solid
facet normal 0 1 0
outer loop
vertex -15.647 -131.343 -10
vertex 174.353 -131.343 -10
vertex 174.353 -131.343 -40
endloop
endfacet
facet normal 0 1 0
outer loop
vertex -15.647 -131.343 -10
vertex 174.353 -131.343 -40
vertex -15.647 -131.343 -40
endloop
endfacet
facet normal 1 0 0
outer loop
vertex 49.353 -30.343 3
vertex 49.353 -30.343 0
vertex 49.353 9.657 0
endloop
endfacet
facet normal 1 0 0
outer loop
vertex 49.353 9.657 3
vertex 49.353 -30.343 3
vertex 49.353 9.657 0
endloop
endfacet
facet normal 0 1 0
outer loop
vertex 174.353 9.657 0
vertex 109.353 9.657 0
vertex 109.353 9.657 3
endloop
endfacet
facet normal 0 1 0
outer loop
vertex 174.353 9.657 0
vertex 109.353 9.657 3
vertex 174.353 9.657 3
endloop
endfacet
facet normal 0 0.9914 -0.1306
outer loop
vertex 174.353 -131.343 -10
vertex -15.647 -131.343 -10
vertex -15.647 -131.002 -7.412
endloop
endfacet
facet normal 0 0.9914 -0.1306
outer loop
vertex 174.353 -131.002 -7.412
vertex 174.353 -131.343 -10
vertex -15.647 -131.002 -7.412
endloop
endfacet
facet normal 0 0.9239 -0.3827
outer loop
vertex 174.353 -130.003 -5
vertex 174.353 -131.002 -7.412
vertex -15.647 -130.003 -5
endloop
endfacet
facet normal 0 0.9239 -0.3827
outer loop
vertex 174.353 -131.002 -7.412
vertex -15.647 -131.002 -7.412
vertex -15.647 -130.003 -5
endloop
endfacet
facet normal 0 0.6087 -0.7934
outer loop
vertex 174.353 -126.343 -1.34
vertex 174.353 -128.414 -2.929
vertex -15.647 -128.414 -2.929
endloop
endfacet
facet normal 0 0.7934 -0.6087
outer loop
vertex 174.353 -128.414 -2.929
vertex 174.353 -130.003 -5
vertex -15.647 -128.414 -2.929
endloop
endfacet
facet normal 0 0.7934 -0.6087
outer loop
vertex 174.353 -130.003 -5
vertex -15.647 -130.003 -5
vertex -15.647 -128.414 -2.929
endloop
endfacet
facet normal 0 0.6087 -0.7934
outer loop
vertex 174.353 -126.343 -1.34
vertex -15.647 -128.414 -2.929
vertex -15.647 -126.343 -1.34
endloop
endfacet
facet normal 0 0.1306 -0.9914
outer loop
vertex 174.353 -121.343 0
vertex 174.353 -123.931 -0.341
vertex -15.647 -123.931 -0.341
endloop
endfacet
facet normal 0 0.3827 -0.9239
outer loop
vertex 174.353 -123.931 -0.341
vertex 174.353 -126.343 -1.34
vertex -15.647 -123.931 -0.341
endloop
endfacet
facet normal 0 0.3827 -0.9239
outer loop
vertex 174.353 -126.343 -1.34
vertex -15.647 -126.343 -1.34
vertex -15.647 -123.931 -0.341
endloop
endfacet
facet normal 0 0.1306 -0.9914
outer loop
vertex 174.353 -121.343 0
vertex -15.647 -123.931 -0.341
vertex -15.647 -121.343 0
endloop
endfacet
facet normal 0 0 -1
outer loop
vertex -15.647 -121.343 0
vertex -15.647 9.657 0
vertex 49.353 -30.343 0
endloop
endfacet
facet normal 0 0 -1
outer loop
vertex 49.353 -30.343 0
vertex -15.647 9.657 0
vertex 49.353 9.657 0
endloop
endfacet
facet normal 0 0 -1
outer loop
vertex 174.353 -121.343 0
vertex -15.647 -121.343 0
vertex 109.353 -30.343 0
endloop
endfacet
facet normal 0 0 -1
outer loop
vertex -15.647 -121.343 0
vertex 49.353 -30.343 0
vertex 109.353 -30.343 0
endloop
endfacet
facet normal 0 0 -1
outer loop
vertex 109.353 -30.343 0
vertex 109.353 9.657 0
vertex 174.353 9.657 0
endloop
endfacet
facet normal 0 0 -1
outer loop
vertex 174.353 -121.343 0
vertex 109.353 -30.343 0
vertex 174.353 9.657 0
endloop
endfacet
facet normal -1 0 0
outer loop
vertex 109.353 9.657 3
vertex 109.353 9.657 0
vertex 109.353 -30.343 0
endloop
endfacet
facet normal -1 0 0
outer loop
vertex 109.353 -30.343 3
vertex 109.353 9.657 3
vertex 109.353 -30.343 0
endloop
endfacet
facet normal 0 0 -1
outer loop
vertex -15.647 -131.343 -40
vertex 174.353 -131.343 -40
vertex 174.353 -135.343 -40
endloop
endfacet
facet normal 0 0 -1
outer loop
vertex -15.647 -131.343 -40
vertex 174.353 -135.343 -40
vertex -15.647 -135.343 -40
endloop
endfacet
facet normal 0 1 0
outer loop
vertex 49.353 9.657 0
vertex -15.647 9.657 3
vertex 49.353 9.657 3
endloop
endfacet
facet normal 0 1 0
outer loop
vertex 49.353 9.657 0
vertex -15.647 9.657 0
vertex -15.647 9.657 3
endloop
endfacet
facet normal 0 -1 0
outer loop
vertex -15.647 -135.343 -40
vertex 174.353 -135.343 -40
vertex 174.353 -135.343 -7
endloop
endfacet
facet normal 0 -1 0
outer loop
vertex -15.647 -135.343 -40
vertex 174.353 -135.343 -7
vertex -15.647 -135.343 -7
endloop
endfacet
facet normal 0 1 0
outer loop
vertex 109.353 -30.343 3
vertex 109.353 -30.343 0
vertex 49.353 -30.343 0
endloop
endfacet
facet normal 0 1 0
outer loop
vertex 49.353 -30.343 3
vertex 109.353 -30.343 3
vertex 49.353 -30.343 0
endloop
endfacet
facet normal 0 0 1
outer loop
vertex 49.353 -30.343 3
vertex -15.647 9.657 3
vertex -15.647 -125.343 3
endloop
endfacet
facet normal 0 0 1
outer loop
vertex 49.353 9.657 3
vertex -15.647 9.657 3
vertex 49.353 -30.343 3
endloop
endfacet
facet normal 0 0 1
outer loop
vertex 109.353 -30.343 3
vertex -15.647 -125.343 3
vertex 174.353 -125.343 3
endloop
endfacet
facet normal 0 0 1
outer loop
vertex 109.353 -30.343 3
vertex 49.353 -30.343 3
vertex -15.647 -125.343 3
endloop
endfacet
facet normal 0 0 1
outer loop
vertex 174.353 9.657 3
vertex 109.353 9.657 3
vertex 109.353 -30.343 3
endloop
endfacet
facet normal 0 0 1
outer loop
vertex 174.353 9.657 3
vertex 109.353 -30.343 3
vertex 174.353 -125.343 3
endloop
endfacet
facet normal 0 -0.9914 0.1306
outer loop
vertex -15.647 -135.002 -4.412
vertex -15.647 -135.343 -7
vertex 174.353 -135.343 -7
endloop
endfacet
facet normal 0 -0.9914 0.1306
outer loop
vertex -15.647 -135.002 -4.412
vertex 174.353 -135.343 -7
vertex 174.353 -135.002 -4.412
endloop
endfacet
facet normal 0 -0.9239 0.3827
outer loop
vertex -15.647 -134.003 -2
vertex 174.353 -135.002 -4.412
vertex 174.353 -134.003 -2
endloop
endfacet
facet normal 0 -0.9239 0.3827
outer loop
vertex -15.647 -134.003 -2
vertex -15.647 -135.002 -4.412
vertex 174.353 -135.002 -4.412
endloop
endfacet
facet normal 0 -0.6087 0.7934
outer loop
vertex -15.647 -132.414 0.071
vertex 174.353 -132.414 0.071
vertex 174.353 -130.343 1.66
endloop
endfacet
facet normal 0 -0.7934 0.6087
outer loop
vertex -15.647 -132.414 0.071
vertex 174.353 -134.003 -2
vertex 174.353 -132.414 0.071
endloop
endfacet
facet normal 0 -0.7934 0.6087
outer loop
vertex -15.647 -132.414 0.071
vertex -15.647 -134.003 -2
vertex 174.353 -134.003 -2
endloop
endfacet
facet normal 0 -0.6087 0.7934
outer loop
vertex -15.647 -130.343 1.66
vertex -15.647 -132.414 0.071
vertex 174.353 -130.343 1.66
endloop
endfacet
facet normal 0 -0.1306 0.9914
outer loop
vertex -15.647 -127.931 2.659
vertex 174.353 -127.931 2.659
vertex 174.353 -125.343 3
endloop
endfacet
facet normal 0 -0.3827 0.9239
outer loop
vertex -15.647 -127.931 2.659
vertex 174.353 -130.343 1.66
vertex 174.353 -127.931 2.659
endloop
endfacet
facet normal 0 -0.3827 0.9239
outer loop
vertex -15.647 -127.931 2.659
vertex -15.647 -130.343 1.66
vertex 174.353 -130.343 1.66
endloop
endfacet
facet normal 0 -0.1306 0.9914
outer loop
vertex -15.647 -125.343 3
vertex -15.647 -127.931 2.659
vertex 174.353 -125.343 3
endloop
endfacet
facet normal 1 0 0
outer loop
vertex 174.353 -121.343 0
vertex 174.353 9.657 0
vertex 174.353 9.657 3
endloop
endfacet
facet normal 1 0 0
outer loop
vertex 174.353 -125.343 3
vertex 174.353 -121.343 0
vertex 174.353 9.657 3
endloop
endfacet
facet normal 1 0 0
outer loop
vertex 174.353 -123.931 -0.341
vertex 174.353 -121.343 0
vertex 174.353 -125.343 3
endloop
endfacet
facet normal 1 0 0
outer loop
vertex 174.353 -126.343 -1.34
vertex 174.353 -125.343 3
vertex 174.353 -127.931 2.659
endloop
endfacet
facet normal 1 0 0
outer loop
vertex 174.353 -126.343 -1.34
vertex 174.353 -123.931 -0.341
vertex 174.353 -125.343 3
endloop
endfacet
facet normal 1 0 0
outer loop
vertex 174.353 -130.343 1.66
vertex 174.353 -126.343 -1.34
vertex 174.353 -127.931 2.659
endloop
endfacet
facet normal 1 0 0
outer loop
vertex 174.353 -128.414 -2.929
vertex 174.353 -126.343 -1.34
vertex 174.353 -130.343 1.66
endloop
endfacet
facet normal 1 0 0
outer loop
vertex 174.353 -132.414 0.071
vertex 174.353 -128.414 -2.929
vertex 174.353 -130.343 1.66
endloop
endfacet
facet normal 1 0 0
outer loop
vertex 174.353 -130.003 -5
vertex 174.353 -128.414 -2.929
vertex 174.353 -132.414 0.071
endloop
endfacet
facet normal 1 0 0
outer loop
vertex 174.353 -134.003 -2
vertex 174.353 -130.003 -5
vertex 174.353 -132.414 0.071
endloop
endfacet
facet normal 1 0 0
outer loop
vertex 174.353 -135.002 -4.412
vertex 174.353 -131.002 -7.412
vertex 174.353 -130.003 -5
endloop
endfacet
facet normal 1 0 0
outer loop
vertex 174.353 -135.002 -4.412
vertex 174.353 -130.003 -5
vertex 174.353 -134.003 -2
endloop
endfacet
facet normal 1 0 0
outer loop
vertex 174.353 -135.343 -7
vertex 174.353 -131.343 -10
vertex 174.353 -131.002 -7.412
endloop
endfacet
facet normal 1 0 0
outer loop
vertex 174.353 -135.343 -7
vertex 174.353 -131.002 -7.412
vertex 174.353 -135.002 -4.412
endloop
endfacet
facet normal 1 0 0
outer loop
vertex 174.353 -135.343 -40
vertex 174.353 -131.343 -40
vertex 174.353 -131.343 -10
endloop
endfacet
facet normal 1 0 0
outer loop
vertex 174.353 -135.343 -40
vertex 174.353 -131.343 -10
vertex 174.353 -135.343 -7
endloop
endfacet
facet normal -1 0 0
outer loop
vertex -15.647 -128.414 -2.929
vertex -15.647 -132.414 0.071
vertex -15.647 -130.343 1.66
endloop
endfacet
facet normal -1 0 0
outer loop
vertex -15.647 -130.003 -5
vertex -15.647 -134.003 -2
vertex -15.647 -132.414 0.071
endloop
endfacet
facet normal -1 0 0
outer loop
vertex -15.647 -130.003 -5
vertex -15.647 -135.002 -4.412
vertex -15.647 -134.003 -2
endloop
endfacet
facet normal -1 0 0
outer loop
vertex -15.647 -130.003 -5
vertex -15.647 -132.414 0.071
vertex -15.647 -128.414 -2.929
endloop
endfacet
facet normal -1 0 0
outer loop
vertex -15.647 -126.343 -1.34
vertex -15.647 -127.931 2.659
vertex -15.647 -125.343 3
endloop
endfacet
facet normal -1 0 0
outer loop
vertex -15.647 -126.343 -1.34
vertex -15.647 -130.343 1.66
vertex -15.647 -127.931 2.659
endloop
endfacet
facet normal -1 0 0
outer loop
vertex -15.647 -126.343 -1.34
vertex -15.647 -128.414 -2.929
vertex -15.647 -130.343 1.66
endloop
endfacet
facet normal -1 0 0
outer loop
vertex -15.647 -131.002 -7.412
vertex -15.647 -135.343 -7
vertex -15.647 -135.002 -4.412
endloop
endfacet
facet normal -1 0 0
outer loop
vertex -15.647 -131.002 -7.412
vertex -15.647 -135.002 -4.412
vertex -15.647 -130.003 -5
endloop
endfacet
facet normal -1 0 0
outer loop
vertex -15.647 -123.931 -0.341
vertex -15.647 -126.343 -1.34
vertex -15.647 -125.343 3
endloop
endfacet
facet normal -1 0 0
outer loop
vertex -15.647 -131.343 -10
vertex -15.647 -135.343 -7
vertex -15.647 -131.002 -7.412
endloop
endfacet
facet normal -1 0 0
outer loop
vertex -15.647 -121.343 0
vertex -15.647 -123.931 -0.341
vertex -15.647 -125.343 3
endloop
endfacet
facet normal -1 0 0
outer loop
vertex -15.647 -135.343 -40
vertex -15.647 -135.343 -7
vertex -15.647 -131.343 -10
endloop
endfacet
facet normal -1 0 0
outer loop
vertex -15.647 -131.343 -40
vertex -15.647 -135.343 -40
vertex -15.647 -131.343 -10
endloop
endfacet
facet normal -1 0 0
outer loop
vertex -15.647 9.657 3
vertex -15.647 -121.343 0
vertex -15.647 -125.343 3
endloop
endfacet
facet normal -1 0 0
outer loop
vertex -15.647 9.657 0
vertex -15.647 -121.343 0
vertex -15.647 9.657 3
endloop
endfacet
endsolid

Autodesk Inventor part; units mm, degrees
ref_plane "YZ Plane" through (0, 0, 0) normal (1, 0, 0) x (0, 1, 0)
ref_plane "XZ Plane" through (0, 0, 0) normal (0, 1, 0) x (-1, 0, 0)
ref_plane "XY Plane" through (0, 0, 0) normal (0, 0, 1) x (1, 0, 0)
sketch "Sketch1" plane through (0, 0, 0) normal (0, 0, 1) x (1, 0, 0)
  line L0 (-15.6474, 9.6574) -> (174.3526, 9.6574)
  line L1 (174.3526, 9.6574) -> (174.3526, -135.3426)
  line L2 (174.3526, -135.3426) -> (-15.6474, -135.3426)
  line L3 (-15.6474, -135.3426) -> (-15.6474, 9.6574)
  line L4 (49.3526, 9.6574) -> (109.3526, 9.6574)
  line L5 (109.3526, 9.6574) -> (109.3526, -30.3426)
  line L6 (109.3526, -30.3426) -> (49.3526, -30.3426)
  line L7 (49.3526, -30.3426) -> (49.3526, 9.6574)
  point P0 (0, 0)
  dimension "d0" = 190
  dimension "d1" = 145
  dimension "d2" = 60
  dimension "d3" = 40
  dimension "d4" = 65
extrude "Extrusion1" add sketch "Sketch1" along normal blind 3 contours L0 L7 L6 L5 L1 L2 L3
sketch "Sketch2" plane through (0, 0, 0) normal (0, 0, -1) x (-1, 0, 0)
  line L0 (15.6474, -135.3426) -> (-174.3526, -135.3426) projected
  line L1 (-174.3526, -135.3426) -> (-174.3526, 9.6574) projected
  line L2 (15.6474, -135.3426) -> (-174.3526, -135.3426)
  line L3 (-174.3526, -135.3426) -> (-174.3526, -131.3426)
  line L4 (-174.3526, -131.3426) -> (15.6474, -131.3426)
  line L5 (15.6474, -131.3426) -> (15.6474, -135.3426)
  point P0 (0, 0)
  dimension "d7" = 4
extrude "Extrusion2" add sketch "Sketch2" along normal blind 40
fillet "Fillet1" radius 10 2 edges at (79.3526, -131.3426, 0) (79.3526, -135.3426, 3)
properties part number "płyta_dla_arduino"
